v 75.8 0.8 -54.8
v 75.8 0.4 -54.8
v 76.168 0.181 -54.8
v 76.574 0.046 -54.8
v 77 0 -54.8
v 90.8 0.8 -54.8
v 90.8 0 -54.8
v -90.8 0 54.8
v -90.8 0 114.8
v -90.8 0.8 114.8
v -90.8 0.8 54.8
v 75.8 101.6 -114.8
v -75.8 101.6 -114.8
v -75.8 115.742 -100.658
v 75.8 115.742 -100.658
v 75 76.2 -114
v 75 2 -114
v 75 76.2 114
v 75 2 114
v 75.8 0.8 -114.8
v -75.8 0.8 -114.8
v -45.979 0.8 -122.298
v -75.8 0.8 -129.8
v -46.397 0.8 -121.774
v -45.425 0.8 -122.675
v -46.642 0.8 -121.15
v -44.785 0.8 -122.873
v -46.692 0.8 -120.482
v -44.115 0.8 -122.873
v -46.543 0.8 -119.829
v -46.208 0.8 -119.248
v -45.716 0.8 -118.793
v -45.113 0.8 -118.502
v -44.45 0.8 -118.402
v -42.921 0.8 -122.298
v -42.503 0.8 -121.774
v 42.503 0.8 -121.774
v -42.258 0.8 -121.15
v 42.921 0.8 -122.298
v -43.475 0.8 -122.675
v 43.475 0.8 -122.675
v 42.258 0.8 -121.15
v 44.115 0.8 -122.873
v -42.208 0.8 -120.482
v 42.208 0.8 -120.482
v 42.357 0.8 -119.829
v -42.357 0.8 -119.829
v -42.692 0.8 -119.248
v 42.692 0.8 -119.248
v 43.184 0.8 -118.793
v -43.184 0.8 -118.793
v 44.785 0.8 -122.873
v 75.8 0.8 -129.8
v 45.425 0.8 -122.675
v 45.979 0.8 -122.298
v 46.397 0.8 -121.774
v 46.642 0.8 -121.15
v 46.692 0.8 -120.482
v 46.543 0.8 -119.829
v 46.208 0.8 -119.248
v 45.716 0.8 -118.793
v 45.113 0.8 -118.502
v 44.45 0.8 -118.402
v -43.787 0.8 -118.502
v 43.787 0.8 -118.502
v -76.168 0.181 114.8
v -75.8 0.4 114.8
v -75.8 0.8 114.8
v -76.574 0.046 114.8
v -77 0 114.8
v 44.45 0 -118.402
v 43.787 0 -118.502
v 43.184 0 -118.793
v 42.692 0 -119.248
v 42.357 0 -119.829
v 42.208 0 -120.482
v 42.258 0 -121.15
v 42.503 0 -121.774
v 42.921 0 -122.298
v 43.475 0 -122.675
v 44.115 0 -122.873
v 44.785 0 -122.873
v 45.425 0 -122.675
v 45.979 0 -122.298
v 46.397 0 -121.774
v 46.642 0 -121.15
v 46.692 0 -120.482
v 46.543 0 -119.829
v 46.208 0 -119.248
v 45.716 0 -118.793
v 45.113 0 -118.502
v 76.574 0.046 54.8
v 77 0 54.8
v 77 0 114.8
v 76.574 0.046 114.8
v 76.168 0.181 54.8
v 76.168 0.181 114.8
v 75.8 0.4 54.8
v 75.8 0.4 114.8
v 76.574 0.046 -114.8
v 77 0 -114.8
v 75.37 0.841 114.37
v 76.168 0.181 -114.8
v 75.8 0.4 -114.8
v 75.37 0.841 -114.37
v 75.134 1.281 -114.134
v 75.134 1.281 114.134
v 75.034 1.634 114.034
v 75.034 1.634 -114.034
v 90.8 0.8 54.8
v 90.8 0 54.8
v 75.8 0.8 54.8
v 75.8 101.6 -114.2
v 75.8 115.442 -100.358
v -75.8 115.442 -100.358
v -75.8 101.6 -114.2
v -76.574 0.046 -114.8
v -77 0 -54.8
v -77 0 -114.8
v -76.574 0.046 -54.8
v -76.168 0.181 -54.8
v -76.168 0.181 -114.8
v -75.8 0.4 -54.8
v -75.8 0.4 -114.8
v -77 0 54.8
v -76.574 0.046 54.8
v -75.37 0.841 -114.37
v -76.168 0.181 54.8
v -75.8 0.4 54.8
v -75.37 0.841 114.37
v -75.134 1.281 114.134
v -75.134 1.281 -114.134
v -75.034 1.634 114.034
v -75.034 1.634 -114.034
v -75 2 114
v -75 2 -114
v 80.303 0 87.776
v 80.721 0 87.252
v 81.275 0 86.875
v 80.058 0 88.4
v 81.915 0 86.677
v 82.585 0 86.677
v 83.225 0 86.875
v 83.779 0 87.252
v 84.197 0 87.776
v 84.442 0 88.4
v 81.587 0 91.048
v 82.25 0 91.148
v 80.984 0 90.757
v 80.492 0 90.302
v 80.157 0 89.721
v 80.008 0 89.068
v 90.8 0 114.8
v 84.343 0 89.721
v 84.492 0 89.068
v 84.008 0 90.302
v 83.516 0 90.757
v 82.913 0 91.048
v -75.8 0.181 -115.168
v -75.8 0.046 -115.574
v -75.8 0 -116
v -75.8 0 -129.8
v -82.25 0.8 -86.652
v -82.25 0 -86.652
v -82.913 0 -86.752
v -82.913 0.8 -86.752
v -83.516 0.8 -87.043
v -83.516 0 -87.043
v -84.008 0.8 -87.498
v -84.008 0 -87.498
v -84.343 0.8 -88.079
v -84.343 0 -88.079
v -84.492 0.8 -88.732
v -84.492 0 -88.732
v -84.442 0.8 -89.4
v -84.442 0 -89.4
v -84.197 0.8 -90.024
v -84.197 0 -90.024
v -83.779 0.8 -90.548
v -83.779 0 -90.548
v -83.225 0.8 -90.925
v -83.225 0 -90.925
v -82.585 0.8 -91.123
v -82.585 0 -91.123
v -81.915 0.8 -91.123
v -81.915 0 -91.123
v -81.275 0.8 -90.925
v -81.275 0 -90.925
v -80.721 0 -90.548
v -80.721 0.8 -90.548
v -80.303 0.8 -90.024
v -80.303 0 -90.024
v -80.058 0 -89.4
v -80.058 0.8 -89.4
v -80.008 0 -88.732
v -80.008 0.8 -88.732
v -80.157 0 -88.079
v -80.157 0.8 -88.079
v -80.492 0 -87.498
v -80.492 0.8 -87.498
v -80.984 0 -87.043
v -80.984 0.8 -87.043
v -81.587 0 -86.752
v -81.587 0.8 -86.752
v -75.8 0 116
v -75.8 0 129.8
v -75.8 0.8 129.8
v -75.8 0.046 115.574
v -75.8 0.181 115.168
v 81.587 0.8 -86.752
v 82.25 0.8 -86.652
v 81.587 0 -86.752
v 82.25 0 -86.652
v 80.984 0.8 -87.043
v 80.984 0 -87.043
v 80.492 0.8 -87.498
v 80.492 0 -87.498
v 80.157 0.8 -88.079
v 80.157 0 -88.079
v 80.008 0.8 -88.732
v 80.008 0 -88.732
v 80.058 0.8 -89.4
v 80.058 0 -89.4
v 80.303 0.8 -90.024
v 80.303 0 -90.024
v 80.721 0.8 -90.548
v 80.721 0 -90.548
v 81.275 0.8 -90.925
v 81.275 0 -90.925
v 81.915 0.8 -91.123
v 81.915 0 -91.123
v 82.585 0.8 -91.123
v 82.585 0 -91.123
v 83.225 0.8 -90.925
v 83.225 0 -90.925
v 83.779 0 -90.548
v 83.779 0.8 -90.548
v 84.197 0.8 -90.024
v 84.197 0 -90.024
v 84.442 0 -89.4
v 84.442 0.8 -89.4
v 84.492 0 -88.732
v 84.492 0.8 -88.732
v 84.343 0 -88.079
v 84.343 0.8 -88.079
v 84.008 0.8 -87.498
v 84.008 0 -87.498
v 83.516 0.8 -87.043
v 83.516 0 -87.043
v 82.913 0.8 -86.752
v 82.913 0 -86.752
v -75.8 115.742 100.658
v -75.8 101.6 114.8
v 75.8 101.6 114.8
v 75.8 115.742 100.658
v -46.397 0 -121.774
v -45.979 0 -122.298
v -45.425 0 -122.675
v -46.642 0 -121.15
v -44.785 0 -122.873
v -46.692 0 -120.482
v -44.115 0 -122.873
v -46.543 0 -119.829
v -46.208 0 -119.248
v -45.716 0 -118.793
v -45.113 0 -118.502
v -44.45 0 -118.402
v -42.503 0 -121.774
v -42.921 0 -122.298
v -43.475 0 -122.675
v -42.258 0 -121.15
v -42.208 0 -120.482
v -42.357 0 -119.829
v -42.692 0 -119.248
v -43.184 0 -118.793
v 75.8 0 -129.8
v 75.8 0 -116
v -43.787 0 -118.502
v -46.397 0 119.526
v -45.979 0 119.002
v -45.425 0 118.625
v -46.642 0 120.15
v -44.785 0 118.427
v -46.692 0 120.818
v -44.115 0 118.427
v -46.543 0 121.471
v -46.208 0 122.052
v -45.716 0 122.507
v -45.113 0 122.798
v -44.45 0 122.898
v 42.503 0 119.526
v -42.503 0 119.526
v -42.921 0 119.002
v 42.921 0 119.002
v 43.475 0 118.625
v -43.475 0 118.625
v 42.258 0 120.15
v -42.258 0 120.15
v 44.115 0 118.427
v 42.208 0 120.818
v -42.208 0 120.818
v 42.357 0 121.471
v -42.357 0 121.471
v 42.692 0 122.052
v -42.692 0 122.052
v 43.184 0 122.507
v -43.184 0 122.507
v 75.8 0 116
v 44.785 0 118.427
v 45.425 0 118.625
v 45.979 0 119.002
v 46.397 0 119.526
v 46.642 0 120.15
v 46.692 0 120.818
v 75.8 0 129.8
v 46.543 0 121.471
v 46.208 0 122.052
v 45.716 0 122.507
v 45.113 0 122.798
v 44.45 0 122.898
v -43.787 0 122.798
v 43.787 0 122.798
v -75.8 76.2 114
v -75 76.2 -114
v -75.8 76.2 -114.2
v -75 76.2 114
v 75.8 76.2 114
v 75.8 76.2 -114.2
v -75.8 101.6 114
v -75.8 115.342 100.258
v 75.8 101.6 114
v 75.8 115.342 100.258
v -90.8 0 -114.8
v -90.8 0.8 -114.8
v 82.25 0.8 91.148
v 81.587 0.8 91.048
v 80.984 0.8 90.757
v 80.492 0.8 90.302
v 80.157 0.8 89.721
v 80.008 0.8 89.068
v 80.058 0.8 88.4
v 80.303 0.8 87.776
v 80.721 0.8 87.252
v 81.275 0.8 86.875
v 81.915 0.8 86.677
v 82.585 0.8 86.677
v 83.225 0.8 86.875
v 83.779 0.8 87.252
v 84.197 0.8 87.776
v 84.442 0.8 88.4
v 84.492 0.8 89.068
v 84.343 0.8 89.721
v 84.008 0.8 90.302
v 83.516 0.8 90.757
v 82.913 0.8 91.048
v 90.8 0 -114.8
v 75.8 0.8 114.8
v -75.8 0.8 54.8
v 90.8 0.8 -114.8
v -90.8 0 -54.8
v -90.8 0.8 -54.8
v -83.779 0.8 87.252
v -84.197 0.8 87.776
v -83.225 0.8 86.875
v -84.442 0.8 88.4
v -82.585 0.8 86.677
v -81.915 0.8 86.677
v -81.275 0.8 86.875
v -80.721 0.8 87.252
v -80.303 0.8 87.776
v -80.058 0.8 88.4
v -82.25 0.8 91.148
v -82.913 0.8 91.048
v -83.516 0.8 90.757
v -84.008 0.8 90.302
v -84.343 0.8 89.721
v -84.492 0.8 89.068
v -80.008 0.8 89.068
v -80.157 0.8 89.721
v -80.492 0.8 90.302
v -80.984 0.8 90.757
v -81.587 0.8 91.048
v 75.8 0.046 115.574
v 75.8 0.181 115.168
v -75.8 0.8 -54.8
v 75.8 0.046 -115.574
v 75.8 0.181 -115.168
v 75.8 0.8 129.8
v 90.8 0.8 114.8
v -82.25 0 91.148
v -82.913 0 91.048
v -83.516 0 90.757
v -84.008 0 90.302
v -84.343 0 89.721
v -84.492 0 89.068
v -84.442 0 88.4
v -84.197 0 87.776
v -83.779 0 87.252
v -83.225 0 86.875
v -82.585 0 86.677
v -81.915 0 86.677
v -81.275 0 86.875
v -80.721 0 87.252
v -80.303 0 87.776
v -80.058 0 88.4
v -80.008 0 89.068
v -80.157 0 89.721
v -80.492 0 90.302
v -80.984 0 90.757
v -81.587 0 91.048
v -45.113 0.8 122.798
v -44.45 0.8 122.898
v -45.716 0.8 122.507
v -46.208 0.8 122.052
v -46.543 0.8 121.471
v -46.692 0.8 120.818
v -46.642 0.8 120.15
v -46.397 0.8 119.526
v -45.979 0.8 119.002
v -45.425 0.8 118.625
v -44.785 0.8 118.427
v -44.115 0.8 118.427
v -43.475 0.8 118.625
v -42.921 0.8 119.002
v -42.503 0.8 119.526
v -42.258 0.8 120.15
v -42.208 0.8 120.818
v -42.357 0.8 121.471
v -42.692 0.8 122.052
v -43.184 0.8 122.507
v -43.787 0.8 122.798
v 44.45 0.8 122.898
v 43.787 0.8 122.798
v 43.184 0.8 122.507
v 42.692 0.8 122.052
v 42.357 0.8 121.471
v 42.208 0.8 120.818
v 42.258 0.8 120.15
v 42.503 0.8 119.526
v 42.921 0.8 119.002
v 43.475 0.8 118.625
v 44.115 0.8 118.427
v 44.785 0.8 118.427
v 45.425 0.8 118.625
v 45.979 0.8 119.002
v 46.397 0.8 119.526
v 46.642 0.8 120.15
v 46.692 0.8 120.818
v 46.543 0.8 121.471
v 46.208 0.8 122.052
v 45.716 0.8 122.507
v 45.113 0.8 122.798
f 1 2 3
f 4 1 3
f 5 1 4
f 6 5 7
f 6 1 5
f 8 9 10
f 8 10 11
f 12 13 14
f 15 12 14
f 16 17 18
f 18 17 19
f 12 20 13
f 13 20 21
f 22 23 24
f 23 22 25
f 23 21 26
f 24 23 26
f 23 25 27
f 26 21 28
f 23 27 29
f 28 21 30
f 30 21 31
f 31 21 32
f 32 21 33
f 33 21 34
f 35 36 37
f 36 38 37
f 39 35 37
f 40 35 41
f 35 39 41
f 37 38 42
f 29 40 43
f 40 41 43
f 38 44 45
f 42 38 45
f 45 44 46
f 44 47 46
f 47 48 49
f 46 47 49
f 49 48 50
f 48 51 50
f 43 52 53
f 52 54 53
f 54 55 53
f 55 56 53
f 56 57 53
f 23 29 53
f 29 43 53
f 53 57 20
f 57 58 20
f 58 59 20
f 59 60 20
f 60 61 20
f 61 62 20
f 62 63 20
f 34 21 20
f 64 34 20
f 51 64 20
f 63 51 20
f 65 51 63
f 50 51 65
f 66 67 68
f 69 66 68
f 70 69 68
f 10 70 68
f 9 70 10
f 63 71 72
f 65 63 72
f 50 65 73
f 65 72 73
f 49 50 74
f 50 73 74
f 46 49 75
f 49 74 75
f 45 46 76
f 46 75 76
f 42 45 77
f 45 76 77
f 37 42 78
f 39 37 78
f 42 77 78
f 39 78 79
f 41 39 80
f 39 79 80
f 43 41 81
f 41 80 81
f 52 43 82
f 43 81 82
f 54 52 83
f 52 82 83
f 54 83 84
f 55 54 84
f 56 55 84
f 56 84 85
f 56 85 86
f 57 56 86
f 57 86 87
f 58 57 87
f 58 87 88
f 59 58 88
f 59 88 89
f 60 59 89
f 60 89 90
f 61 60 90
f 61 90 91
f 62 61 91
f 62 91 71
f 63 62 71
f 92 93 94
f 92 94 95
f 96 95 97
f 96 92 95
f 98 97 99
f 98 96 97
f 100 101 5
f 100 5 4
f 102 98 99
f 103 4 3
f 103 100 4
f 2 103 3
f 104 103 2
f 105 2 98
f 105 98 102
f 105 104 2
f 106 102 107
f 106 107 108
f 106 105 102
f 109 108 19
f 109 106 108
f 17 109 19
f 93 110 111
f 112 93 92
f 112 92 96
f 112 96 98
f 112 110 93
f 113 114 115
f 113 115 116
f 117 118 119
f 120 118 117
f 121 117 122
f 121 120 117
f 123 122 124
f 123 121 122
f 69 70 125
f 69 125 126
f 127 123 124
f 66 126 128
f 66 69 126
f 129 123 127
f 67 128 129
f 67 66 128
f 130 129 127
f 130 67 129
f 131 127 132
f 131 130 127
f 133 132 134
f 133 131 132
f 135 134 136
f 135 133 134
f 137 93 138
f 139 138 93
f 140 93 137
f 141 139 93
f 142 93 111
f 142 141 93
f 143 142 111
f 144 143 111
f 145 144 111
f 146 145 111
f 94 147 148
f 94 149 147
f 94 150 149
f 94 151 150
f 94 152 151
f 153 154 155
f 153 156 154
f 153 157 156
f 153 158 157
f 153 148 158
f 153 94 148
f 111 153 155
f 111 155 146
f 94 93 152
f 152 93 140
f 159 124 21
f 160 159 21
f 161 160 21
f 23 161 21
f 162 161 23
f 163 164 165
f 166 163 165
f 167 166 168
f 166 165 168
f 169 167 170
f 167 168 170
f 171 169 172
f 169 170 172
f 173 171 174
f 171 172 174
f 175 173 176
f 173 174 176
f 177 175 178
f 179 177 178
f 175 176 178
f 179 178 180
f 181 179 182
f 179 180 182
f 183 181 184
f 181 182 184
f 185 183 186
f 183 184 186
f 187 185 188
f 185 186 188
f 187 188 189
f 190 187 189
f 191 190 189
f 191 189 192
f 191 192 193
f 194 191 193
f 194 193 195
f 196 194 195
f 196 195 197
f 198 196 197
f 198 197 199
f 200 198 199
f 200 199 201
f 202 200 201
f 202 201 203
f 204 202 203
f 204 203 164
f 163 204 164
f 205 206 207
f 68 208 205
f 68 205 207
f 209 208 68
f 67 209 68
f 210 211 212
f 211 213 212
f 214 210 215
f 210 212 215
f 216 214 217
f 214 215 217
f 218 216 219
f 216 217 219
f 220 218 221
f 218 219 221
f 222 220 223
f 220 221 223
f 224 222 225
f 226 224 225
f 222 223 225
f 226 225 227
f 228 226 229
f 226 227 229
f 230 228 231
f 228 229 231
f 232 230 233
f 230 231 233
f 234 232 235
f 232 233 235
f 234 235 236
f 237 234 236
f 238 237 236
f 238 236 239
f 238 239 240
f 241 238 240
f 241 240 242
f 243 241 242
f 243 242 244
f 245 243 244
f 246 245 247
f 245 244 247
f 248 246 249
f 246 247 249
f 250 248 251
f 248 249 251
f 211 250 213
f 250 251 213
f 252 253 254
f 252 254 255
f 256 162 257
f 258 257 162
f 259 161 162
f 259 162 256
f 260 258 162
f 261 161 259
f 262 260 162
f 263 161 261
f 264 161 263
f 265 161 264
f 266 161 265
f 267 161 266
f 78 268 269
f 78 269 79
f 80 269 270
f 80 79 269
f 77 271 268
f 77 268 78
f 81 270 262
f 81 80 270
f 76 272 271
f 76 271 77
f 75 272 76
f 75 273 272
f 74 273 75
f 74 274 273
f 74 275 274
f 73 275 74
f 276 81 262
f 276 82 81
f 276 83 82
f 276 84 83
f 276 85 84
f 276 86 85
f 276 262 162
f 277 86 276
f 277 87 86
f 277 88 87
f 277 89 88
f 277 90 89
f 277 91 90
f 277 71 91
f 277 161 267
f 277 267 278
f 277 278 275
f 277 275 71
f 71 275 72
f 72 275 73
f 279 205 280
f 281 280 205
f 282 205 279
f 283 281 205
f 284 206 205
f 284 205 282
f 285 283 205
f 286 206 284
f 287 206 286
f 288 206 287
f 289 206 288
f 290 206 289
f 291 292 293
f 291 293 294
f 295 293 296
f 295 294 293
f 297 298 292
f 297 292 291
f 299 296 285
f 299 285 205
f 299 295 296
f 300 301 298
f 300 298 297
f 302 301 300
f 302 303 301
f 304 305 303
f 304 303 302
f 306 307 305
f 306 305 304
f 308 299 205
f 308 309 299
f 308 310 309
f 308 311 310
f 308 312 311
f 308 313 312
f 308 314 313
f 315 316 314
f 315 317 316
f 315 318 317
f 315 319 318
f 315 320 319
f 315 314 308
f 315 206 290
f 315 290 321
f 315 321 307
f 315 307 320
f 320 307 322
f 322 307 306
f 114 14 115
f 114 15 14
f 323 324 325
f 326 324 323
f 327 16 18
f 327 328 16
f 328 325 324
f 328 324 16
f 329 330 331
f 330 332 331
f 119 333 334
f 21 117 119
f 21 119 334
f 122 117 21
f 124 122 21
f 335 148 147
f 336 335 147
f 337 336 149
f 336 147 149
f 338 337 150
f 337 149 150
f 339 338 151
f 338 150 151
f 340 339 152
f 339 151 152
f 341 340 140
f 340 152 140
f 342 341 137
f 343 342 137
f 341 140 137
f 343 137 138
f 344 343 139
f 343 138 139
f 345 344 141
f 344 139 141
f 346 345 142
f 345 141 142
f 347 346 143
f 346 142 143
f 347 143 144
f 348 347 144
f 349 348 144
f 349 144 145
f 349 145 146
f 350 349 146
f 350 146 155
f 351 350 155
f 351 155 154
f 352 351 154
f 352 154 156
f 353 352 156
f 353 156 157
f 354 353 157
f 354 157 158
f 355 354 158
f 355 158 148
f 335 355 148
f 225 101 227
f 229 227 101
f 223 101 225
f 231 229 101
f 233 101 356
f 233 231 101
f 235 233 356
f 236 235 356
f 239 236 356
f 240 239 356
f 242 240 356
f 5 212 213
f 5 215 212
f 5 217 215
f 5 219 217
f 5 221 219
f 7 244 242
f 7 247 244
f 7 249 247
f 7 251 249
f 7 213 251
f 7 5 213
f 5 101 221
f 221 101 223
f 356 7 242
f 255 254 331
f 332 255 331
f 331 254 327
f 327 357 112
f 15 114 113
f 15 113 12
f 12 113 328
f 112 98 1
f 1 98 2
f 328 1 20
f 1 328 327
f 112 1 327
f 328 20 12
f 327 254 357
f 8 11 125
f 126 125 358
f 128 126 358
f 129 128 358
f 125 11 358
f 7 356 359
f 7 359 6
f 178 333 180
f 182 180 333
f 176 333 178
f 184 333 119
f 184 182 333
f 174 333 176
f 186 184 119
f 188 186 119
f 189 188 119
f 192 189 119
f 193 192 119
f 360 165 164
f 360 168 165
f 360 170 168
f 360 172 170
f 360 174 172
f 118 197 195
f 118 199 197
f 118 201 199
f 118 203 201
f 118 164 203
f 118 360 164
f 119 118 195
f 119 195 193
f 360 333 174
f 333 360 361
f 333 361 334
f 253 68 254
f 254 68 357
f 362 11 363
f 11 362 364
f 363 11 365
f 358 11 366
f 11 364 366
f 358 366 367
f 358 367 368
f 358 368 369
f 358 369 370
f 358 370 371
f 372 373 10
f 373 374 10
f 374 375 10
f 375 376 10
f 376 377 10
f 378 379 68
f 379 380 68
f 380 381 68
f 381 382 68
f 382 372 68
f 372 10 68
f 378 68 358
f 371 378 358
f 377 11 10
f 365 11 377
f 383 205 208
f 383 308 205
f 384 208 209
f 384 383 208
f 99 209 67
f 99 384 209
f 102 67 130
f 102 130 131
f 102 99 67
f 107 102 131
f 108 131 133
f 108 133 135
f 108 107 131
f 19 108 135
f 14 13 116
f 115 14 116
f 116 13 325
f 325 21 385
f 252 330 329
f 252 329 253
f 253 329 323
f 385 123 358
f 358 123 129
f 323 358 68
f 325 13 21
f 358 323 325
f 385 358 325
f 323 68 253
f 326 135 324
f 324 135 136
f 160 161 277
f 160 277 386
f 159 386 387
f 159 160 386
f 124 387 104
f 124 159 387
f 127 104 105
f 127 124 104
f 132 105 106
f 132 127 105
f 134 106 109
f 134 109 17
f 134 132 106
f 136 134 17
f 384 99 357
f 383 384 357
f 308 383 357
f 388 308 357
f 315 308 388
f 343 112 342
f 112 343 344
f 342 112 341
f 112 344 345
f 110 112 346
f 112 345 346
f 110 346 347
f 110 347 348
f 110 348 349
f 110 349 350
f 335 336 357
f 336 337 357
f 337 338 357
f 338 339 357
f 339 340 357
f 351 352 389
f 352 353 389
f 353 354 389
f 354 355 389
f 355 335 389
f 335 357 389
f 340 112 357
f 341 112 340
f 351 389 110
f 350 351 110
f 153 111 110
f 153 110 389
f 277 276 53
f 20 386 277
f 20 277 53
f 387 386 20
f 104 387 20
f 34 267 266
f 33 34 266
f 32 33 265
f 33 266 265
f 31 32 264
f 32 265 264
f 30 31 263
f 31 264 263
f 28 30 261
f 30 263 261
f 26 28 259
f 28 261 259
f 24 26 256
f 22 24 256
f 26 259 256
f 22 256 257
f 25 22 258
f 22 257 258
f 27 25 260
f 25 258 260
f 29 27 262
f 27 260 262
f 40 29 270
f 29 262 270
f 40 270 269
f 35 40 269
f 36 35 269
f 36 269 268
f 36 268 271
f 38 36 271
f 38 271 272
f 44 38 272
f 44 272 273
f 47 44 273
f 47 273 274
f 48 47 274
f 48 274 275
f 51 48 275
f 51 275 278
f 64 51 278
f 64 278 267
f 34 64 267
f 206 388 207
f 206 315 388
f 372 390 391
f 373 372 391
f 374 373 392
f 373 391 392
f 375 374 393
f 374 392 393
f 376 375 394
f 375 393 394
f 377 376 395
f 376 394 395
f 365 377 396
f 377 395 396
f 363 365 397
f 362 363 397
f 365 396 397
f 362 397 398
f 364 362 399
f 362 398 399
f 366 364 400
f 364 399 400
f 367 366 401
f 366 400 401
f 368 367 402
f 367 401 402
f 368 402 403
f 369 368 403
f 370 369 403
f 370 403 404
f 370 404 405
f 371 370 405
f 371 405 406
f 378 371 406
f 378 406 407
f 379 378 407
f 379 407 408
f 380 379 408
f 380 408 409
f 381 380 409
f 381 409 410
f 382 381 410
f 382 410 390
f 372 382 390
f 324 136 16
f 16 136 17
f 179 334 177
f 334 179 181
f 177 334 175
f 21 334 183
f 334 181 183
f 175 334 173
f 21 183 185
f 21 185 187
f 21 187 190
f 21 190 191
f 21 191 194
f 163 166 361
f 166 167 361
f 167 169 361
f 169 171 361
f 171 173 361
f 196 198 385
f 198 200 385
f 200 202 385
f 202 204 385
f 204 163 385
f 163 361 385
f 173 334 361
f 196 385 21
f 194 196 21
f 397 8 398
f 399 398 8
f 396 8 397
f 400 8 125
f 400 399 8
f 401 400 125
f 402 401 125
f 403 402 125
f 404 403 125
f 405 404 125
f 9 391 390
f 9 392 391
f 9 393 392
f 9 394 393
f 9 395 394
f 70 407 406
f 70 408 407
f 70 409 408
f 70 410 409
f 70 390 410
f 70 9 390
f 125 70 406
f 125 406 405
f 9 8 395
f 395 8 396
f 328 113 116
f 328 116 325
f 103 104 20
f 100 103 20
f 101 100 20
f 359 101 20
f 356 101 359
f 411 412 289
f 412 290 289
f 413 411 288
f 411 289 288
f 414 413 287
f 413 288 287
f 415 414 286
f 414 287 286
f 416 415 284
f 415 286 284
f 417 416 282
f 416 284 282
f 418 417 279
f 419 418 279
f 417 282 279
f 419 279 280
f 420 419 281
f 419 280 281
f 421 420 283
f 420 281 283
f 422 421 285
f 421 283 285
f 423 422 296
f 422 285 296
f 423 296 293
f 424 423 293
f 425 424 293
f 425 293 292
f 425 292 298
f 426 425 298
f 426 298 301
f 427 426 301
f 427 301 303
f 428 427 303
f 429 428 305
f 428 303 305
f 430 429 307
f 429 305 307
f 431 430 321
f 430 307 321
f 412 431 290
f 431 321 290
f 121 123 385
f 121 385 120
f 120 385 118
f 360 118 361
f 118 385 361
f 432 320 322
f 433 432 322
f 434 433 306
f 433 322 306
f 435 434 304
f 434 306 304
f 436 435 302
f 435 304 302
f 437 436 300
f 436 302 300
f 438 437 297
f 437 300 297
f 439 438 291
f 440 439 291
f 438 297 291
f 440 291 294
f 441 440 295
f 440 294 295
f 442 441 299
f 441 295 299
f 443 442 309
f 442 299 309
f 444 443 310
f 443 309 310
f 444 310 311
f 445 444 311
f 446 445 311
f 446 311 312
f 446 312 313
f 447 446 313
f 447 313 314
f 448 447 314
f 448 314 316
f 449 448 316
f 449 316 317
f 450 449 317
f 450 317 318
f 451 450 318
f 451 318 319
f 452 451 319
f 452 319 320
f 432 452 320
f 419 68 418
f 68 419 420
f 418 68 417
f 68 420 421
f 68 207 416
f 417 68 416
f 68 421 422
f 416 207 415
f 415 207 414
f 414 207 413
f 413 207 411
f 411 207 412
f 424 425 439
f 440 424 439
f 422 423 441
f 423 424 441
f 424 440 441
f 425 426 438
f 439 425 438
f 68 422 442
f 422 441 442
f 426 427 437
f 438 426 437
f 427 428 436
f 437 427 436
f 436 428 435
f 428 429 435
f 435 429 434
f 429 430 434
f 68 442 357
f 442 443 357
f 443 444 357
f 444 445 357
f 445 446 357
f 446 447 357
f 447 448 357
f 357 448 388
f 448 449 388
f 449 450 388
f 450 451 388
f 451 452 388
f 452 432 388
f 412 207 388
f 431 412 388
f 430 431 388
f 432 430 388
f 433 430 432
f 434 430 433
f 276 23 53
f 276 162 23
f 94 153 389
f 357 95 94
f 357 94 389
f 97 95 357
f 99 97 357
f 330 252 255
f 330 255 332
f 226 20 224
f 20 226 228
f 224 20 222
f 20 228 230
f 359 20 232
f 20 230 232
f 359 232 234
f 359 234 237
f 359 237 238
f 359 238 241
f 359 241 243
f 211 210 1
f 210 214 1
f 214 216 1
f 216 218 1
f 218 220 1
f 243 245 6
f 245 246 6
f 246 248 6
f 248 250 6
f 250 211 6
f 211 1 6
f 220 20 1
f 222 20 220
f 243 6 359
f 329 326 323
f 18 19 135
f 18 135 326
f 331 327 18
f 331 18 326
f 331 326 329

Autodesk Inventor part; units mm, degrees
ref_plane "YZ Plane" through (0, 0, 0) normal (1, 0, 0) x (0, 1, 0)
ref_plane "XZ Plane" through (0, 0, 0) normal (0, 1, 0) x (-1, 0, 0)
ref_plane "XY Plane" through (0, 0, 0) normal (0, 0, 1) x (1, 0, 0)
sketch "Sketch1" plane through (0, 0, 0) normal (0, 1, 0) x (-1, 0, 0)
  line L0 (-75, 114) -> (75, 114)
  line L1 (75, 114) -> (75, -114)
  line L2 (75, -114) -> (-75, -114)
  line L3 (-75, -114) -> (-75, 114)
  line L4 (-75, 114) -> (75, -114) construction
  line L5 (75, 114) -> (-75, -114) construction
  line L6 (75.8, 114.8) -> (-75.8, 114.8)
  line L7 (-75.8, 114.8) -> (-75.8, -114.8)
  line L8 (-75.8, -114.8) -> (75.8, -114.8)
  line L9 (75.8, -114.8) -> (75.8, 114.8)
  point P0 (0, 0)
  dimension "d0" = 150
  dimension "d1" = 228
  dimension "d2" = 0.8
extrude "Extrusion1" add sketch "Sketch1" along normal blind 101.6
sketch "Sketch3" plane through (0, 0, 0) normal (0, -1, 0) x (1, 0, 0)
  line L0 (75.8, 114.8) -> (75.8, -114.8) projected
  line L1 (75.8, -114.8) -> (-75.8, -114.8) projected
  line L2 (75.8, 114.8) -> (75.8, -114.8)
  line L3 (75.8, -114.8) -> (90.8, -114.8)
  line L4 (90.8, -114.8) -> (90.8, 114.8)
  line L5 (90.8, 114.8) -> (75.8, 114.8)
  line L6 (75.8, -114.8) -> (-75.8, -114.8)
  line L7 (-75.8, -114.8) -> (-75.8, -129.8)
  line L8 (-75.8, -129.8) -> (75.8, -129.8)
  line L9 (75.8, -129.8) -> (75.8, -114.8)
  line L10 (-75.8, 114.8) -> (75.8, 114.8) projected
  line L11 (-75.8, -114.8) -> (-75.8, 114.8)
  line L12 (-75.8, 114.8) -> (-90.8, 114.8)
  line L13 (-90.8, 114.8) -> (-90.8, -114.8)
  line L14 (-90.8, -114.8) -> (-75.8, -114.8)
  line L15 (-75.8, 114.8) -> (75.8, 114.8)
  line L16 (75.8, 114.8) -> (75.8, 129.8)
  line L17 (75.8, 129.8) -> (-75.8, 129.8)
  line L18 (-75.8, 129.8) -> (-75.8, 114.8)
  point P0 (0, 0)
  dimension "d11" = 15
  dimension "d12" = 15
  dimension "d13" = 15
  dimension "d14" = 15
extrude "Extrusion3" add sketch "Sketch3" against normal blind 0.8 contours L5 L4 L3 L0 | L10 L18 L17 L16 | L9 L8 L7 L1 | L11 L14 L13 L12
fillet "Fillet1" radius 2 4 edges at (75, 0, 0) (0, 0, -114) (-75, 0, 0) (0, 0, 114)
sketch "Sketch4" plane through (0, 0.8, 0) normal (0, 1, 0) x (1, 0, 0)
  line L0 (82.25, 120.65) -> (-82.25, 120.65) construction
  line L1 (-82.25, 120.65) -> (-82.25, -120.65) construction
  line L2 (-82.25, -120.65) -> (82.25, -120.65) construction
  line L3 (82.25, -120.65) -> (82.25, 120.65) construction
  line L4 (82.25, 120.65) -> (-82.25, -120.65) construction
  line L5 (-82.25, 120.65) -> (82.25, -120.65) construction
  line L6 (0, 0) -> (0, -60) construction
  line L7 (0, 0) -> (60, 0) construction
  point P0 (44.45, 120.65)
  point P1 (-44.45, 120.65)
  point P2 (-82.25, 88.9)
  point P3 (-82.25, 0)
  point P4 (-82.25, -88.9)
  point P5 (-44.45, -120.65)
  point P6 (44.45, -120.65)
  point P7 (82.25, -88.9)
  point P8 (82.25, 0)
  point P9 (82.25, 88.9)
  dimension "d18" = 164.5
  dimension "d19" = 241.3
  dimension "d20" = 88.9
  dimension "d21" = 60
  dimension "d22" = 90
  dimension "d23" = 88.9
  dimension "d24" = 88.9
hole "Hole1" at (44.45, 0.8, -120.65) at (-44.45, 0.8, -120.65) at (-82.25, 0.8, -88.9) at (-82.25, 0.8, 0) at (-82.25, 0.8, 88.9) at (-44.45, 0.8, 120.65) at (44.45, 0.8, 120.65) at (82.25, 0.8, 88.9) at (82.25, 0.8, 0) at (82.25, 0.8, -88.9) direction (0, -1, 0) diameter 4.496 end through all clearance for "Flat Head Machine Screw (82)" size "#8" standard "Ansi Unified Screw Threads"
sketch "Sketch8" plane through (75.8, 101.6, 114.8) normal (1, 0, 0) x (0, 0, -1)
  line L0 (0.8, -99.6) -> (0.8, 0) projected
  line L1 (0.8, 0) -> (229, 0)
  line L2 (229, 0) -> (229, -25.4)
  line L3 (229, -25.4) -> (0.8, -25.4)
  line L4 (0.8, -25.4) -> (0.8, 0)
  point P0 (114.8, -101.6)
  dimension "d48" = 25.4
extrude "Extrusion7" cut sketch "Sketch8" against normal through all
sketch "Sketch9" plane through (75.8, 0.8, 114.8) normal (1, 0, 0) x (0, 0, -1)
  line L0 (0, 100.8) -> (14.1421, 114.9421)
  line L1 (0, 100.8) -> (20, 100.8) construction
  line L2 (14.5421, 114.5421) -> (0.8, 100.8)
  line L3 (14.1421, 114.9421) -> (14.5421, 114.5421)
  line L4 (229.6, 0) -> (229.6, 100.8) projected
  line L5 (229.6, 100.8) -> (215.4579, 114.9421)
  line L6 (229.6, 100.8) -> (249.6, 100.8) construction
  line L7 (215.1579, 114.6421) -> (229, 100.8)
  line L8 (229, 100.8) -> (229.6, 100.8) projected
  line L9 (229, 100.8) -> (229.6, 100.8)
  line L10 (215.4579, 114.9421) -> (215.1579, 114.6421)
  line L11 (0.8, 100.8) -> (0, 100.8) projected
  line L12 (0, 100.8) -> (0.8, 100.8)
  point P0 (114.8, -0.8)
  dimension "d51" = 20
  dimension "d52" = 45
  dimension "d53" = 20
  dimension "d54" = 135
extrude "Extrusion8" add sketch "Sketch9" against normal up to surface (151.6 mm away)
sketch "Sketch10" plane through (0, 0.8, 0) normal (0, 1, 0) x (1, 0, 0)
  line L0 (75.8, 114.2) -> (75.8, -114) projected
  line L1 (-75.8, -114) -> (-75.8, 114.2) projected
  line L2 (-75.8, -114.8) -> (75.8, -114.8) projected
  line L3 (75.8, 114.8) -> (-75.8, 114.8) projected
  line L4 (90.8, -114.8) -> (90.8, 114.8) projected
  line L5 (90.8, -54.8) -> (75.8, -54.8)
  line L6 (75.8, -54.8) -> (75.8, 54.8)
  line L7 (75.8, 54.8) -> (90.8, 54.8)
  line L8 (90.8, 54.8) -> (90.8, -54.8)
  line L9 (90.8, 114.8) -> (75.8, 114.8) projected
  line L10 (75.8, -114.8) -> (90.8, -114.8) projected
  line L11 (0, 0) -> (0, 22) construction
  line L12 (-90.8, -54.8) -> (-75.8, -54.8)
  line L13 (-75.8, -54.8) -> (-75.8, 54.8)
  line L14 (-75.8, 54.8) -> (-90.8, 54.8)
  line L15 (-90.8, 54.8) -> (-90.8, -54.8)
  dimension "d57" = 60
  dimension "d58" = 60
extrude "Extrusion9" cut sketch "Sketch10" against normal through all
properties part number "chimneyHousing"
